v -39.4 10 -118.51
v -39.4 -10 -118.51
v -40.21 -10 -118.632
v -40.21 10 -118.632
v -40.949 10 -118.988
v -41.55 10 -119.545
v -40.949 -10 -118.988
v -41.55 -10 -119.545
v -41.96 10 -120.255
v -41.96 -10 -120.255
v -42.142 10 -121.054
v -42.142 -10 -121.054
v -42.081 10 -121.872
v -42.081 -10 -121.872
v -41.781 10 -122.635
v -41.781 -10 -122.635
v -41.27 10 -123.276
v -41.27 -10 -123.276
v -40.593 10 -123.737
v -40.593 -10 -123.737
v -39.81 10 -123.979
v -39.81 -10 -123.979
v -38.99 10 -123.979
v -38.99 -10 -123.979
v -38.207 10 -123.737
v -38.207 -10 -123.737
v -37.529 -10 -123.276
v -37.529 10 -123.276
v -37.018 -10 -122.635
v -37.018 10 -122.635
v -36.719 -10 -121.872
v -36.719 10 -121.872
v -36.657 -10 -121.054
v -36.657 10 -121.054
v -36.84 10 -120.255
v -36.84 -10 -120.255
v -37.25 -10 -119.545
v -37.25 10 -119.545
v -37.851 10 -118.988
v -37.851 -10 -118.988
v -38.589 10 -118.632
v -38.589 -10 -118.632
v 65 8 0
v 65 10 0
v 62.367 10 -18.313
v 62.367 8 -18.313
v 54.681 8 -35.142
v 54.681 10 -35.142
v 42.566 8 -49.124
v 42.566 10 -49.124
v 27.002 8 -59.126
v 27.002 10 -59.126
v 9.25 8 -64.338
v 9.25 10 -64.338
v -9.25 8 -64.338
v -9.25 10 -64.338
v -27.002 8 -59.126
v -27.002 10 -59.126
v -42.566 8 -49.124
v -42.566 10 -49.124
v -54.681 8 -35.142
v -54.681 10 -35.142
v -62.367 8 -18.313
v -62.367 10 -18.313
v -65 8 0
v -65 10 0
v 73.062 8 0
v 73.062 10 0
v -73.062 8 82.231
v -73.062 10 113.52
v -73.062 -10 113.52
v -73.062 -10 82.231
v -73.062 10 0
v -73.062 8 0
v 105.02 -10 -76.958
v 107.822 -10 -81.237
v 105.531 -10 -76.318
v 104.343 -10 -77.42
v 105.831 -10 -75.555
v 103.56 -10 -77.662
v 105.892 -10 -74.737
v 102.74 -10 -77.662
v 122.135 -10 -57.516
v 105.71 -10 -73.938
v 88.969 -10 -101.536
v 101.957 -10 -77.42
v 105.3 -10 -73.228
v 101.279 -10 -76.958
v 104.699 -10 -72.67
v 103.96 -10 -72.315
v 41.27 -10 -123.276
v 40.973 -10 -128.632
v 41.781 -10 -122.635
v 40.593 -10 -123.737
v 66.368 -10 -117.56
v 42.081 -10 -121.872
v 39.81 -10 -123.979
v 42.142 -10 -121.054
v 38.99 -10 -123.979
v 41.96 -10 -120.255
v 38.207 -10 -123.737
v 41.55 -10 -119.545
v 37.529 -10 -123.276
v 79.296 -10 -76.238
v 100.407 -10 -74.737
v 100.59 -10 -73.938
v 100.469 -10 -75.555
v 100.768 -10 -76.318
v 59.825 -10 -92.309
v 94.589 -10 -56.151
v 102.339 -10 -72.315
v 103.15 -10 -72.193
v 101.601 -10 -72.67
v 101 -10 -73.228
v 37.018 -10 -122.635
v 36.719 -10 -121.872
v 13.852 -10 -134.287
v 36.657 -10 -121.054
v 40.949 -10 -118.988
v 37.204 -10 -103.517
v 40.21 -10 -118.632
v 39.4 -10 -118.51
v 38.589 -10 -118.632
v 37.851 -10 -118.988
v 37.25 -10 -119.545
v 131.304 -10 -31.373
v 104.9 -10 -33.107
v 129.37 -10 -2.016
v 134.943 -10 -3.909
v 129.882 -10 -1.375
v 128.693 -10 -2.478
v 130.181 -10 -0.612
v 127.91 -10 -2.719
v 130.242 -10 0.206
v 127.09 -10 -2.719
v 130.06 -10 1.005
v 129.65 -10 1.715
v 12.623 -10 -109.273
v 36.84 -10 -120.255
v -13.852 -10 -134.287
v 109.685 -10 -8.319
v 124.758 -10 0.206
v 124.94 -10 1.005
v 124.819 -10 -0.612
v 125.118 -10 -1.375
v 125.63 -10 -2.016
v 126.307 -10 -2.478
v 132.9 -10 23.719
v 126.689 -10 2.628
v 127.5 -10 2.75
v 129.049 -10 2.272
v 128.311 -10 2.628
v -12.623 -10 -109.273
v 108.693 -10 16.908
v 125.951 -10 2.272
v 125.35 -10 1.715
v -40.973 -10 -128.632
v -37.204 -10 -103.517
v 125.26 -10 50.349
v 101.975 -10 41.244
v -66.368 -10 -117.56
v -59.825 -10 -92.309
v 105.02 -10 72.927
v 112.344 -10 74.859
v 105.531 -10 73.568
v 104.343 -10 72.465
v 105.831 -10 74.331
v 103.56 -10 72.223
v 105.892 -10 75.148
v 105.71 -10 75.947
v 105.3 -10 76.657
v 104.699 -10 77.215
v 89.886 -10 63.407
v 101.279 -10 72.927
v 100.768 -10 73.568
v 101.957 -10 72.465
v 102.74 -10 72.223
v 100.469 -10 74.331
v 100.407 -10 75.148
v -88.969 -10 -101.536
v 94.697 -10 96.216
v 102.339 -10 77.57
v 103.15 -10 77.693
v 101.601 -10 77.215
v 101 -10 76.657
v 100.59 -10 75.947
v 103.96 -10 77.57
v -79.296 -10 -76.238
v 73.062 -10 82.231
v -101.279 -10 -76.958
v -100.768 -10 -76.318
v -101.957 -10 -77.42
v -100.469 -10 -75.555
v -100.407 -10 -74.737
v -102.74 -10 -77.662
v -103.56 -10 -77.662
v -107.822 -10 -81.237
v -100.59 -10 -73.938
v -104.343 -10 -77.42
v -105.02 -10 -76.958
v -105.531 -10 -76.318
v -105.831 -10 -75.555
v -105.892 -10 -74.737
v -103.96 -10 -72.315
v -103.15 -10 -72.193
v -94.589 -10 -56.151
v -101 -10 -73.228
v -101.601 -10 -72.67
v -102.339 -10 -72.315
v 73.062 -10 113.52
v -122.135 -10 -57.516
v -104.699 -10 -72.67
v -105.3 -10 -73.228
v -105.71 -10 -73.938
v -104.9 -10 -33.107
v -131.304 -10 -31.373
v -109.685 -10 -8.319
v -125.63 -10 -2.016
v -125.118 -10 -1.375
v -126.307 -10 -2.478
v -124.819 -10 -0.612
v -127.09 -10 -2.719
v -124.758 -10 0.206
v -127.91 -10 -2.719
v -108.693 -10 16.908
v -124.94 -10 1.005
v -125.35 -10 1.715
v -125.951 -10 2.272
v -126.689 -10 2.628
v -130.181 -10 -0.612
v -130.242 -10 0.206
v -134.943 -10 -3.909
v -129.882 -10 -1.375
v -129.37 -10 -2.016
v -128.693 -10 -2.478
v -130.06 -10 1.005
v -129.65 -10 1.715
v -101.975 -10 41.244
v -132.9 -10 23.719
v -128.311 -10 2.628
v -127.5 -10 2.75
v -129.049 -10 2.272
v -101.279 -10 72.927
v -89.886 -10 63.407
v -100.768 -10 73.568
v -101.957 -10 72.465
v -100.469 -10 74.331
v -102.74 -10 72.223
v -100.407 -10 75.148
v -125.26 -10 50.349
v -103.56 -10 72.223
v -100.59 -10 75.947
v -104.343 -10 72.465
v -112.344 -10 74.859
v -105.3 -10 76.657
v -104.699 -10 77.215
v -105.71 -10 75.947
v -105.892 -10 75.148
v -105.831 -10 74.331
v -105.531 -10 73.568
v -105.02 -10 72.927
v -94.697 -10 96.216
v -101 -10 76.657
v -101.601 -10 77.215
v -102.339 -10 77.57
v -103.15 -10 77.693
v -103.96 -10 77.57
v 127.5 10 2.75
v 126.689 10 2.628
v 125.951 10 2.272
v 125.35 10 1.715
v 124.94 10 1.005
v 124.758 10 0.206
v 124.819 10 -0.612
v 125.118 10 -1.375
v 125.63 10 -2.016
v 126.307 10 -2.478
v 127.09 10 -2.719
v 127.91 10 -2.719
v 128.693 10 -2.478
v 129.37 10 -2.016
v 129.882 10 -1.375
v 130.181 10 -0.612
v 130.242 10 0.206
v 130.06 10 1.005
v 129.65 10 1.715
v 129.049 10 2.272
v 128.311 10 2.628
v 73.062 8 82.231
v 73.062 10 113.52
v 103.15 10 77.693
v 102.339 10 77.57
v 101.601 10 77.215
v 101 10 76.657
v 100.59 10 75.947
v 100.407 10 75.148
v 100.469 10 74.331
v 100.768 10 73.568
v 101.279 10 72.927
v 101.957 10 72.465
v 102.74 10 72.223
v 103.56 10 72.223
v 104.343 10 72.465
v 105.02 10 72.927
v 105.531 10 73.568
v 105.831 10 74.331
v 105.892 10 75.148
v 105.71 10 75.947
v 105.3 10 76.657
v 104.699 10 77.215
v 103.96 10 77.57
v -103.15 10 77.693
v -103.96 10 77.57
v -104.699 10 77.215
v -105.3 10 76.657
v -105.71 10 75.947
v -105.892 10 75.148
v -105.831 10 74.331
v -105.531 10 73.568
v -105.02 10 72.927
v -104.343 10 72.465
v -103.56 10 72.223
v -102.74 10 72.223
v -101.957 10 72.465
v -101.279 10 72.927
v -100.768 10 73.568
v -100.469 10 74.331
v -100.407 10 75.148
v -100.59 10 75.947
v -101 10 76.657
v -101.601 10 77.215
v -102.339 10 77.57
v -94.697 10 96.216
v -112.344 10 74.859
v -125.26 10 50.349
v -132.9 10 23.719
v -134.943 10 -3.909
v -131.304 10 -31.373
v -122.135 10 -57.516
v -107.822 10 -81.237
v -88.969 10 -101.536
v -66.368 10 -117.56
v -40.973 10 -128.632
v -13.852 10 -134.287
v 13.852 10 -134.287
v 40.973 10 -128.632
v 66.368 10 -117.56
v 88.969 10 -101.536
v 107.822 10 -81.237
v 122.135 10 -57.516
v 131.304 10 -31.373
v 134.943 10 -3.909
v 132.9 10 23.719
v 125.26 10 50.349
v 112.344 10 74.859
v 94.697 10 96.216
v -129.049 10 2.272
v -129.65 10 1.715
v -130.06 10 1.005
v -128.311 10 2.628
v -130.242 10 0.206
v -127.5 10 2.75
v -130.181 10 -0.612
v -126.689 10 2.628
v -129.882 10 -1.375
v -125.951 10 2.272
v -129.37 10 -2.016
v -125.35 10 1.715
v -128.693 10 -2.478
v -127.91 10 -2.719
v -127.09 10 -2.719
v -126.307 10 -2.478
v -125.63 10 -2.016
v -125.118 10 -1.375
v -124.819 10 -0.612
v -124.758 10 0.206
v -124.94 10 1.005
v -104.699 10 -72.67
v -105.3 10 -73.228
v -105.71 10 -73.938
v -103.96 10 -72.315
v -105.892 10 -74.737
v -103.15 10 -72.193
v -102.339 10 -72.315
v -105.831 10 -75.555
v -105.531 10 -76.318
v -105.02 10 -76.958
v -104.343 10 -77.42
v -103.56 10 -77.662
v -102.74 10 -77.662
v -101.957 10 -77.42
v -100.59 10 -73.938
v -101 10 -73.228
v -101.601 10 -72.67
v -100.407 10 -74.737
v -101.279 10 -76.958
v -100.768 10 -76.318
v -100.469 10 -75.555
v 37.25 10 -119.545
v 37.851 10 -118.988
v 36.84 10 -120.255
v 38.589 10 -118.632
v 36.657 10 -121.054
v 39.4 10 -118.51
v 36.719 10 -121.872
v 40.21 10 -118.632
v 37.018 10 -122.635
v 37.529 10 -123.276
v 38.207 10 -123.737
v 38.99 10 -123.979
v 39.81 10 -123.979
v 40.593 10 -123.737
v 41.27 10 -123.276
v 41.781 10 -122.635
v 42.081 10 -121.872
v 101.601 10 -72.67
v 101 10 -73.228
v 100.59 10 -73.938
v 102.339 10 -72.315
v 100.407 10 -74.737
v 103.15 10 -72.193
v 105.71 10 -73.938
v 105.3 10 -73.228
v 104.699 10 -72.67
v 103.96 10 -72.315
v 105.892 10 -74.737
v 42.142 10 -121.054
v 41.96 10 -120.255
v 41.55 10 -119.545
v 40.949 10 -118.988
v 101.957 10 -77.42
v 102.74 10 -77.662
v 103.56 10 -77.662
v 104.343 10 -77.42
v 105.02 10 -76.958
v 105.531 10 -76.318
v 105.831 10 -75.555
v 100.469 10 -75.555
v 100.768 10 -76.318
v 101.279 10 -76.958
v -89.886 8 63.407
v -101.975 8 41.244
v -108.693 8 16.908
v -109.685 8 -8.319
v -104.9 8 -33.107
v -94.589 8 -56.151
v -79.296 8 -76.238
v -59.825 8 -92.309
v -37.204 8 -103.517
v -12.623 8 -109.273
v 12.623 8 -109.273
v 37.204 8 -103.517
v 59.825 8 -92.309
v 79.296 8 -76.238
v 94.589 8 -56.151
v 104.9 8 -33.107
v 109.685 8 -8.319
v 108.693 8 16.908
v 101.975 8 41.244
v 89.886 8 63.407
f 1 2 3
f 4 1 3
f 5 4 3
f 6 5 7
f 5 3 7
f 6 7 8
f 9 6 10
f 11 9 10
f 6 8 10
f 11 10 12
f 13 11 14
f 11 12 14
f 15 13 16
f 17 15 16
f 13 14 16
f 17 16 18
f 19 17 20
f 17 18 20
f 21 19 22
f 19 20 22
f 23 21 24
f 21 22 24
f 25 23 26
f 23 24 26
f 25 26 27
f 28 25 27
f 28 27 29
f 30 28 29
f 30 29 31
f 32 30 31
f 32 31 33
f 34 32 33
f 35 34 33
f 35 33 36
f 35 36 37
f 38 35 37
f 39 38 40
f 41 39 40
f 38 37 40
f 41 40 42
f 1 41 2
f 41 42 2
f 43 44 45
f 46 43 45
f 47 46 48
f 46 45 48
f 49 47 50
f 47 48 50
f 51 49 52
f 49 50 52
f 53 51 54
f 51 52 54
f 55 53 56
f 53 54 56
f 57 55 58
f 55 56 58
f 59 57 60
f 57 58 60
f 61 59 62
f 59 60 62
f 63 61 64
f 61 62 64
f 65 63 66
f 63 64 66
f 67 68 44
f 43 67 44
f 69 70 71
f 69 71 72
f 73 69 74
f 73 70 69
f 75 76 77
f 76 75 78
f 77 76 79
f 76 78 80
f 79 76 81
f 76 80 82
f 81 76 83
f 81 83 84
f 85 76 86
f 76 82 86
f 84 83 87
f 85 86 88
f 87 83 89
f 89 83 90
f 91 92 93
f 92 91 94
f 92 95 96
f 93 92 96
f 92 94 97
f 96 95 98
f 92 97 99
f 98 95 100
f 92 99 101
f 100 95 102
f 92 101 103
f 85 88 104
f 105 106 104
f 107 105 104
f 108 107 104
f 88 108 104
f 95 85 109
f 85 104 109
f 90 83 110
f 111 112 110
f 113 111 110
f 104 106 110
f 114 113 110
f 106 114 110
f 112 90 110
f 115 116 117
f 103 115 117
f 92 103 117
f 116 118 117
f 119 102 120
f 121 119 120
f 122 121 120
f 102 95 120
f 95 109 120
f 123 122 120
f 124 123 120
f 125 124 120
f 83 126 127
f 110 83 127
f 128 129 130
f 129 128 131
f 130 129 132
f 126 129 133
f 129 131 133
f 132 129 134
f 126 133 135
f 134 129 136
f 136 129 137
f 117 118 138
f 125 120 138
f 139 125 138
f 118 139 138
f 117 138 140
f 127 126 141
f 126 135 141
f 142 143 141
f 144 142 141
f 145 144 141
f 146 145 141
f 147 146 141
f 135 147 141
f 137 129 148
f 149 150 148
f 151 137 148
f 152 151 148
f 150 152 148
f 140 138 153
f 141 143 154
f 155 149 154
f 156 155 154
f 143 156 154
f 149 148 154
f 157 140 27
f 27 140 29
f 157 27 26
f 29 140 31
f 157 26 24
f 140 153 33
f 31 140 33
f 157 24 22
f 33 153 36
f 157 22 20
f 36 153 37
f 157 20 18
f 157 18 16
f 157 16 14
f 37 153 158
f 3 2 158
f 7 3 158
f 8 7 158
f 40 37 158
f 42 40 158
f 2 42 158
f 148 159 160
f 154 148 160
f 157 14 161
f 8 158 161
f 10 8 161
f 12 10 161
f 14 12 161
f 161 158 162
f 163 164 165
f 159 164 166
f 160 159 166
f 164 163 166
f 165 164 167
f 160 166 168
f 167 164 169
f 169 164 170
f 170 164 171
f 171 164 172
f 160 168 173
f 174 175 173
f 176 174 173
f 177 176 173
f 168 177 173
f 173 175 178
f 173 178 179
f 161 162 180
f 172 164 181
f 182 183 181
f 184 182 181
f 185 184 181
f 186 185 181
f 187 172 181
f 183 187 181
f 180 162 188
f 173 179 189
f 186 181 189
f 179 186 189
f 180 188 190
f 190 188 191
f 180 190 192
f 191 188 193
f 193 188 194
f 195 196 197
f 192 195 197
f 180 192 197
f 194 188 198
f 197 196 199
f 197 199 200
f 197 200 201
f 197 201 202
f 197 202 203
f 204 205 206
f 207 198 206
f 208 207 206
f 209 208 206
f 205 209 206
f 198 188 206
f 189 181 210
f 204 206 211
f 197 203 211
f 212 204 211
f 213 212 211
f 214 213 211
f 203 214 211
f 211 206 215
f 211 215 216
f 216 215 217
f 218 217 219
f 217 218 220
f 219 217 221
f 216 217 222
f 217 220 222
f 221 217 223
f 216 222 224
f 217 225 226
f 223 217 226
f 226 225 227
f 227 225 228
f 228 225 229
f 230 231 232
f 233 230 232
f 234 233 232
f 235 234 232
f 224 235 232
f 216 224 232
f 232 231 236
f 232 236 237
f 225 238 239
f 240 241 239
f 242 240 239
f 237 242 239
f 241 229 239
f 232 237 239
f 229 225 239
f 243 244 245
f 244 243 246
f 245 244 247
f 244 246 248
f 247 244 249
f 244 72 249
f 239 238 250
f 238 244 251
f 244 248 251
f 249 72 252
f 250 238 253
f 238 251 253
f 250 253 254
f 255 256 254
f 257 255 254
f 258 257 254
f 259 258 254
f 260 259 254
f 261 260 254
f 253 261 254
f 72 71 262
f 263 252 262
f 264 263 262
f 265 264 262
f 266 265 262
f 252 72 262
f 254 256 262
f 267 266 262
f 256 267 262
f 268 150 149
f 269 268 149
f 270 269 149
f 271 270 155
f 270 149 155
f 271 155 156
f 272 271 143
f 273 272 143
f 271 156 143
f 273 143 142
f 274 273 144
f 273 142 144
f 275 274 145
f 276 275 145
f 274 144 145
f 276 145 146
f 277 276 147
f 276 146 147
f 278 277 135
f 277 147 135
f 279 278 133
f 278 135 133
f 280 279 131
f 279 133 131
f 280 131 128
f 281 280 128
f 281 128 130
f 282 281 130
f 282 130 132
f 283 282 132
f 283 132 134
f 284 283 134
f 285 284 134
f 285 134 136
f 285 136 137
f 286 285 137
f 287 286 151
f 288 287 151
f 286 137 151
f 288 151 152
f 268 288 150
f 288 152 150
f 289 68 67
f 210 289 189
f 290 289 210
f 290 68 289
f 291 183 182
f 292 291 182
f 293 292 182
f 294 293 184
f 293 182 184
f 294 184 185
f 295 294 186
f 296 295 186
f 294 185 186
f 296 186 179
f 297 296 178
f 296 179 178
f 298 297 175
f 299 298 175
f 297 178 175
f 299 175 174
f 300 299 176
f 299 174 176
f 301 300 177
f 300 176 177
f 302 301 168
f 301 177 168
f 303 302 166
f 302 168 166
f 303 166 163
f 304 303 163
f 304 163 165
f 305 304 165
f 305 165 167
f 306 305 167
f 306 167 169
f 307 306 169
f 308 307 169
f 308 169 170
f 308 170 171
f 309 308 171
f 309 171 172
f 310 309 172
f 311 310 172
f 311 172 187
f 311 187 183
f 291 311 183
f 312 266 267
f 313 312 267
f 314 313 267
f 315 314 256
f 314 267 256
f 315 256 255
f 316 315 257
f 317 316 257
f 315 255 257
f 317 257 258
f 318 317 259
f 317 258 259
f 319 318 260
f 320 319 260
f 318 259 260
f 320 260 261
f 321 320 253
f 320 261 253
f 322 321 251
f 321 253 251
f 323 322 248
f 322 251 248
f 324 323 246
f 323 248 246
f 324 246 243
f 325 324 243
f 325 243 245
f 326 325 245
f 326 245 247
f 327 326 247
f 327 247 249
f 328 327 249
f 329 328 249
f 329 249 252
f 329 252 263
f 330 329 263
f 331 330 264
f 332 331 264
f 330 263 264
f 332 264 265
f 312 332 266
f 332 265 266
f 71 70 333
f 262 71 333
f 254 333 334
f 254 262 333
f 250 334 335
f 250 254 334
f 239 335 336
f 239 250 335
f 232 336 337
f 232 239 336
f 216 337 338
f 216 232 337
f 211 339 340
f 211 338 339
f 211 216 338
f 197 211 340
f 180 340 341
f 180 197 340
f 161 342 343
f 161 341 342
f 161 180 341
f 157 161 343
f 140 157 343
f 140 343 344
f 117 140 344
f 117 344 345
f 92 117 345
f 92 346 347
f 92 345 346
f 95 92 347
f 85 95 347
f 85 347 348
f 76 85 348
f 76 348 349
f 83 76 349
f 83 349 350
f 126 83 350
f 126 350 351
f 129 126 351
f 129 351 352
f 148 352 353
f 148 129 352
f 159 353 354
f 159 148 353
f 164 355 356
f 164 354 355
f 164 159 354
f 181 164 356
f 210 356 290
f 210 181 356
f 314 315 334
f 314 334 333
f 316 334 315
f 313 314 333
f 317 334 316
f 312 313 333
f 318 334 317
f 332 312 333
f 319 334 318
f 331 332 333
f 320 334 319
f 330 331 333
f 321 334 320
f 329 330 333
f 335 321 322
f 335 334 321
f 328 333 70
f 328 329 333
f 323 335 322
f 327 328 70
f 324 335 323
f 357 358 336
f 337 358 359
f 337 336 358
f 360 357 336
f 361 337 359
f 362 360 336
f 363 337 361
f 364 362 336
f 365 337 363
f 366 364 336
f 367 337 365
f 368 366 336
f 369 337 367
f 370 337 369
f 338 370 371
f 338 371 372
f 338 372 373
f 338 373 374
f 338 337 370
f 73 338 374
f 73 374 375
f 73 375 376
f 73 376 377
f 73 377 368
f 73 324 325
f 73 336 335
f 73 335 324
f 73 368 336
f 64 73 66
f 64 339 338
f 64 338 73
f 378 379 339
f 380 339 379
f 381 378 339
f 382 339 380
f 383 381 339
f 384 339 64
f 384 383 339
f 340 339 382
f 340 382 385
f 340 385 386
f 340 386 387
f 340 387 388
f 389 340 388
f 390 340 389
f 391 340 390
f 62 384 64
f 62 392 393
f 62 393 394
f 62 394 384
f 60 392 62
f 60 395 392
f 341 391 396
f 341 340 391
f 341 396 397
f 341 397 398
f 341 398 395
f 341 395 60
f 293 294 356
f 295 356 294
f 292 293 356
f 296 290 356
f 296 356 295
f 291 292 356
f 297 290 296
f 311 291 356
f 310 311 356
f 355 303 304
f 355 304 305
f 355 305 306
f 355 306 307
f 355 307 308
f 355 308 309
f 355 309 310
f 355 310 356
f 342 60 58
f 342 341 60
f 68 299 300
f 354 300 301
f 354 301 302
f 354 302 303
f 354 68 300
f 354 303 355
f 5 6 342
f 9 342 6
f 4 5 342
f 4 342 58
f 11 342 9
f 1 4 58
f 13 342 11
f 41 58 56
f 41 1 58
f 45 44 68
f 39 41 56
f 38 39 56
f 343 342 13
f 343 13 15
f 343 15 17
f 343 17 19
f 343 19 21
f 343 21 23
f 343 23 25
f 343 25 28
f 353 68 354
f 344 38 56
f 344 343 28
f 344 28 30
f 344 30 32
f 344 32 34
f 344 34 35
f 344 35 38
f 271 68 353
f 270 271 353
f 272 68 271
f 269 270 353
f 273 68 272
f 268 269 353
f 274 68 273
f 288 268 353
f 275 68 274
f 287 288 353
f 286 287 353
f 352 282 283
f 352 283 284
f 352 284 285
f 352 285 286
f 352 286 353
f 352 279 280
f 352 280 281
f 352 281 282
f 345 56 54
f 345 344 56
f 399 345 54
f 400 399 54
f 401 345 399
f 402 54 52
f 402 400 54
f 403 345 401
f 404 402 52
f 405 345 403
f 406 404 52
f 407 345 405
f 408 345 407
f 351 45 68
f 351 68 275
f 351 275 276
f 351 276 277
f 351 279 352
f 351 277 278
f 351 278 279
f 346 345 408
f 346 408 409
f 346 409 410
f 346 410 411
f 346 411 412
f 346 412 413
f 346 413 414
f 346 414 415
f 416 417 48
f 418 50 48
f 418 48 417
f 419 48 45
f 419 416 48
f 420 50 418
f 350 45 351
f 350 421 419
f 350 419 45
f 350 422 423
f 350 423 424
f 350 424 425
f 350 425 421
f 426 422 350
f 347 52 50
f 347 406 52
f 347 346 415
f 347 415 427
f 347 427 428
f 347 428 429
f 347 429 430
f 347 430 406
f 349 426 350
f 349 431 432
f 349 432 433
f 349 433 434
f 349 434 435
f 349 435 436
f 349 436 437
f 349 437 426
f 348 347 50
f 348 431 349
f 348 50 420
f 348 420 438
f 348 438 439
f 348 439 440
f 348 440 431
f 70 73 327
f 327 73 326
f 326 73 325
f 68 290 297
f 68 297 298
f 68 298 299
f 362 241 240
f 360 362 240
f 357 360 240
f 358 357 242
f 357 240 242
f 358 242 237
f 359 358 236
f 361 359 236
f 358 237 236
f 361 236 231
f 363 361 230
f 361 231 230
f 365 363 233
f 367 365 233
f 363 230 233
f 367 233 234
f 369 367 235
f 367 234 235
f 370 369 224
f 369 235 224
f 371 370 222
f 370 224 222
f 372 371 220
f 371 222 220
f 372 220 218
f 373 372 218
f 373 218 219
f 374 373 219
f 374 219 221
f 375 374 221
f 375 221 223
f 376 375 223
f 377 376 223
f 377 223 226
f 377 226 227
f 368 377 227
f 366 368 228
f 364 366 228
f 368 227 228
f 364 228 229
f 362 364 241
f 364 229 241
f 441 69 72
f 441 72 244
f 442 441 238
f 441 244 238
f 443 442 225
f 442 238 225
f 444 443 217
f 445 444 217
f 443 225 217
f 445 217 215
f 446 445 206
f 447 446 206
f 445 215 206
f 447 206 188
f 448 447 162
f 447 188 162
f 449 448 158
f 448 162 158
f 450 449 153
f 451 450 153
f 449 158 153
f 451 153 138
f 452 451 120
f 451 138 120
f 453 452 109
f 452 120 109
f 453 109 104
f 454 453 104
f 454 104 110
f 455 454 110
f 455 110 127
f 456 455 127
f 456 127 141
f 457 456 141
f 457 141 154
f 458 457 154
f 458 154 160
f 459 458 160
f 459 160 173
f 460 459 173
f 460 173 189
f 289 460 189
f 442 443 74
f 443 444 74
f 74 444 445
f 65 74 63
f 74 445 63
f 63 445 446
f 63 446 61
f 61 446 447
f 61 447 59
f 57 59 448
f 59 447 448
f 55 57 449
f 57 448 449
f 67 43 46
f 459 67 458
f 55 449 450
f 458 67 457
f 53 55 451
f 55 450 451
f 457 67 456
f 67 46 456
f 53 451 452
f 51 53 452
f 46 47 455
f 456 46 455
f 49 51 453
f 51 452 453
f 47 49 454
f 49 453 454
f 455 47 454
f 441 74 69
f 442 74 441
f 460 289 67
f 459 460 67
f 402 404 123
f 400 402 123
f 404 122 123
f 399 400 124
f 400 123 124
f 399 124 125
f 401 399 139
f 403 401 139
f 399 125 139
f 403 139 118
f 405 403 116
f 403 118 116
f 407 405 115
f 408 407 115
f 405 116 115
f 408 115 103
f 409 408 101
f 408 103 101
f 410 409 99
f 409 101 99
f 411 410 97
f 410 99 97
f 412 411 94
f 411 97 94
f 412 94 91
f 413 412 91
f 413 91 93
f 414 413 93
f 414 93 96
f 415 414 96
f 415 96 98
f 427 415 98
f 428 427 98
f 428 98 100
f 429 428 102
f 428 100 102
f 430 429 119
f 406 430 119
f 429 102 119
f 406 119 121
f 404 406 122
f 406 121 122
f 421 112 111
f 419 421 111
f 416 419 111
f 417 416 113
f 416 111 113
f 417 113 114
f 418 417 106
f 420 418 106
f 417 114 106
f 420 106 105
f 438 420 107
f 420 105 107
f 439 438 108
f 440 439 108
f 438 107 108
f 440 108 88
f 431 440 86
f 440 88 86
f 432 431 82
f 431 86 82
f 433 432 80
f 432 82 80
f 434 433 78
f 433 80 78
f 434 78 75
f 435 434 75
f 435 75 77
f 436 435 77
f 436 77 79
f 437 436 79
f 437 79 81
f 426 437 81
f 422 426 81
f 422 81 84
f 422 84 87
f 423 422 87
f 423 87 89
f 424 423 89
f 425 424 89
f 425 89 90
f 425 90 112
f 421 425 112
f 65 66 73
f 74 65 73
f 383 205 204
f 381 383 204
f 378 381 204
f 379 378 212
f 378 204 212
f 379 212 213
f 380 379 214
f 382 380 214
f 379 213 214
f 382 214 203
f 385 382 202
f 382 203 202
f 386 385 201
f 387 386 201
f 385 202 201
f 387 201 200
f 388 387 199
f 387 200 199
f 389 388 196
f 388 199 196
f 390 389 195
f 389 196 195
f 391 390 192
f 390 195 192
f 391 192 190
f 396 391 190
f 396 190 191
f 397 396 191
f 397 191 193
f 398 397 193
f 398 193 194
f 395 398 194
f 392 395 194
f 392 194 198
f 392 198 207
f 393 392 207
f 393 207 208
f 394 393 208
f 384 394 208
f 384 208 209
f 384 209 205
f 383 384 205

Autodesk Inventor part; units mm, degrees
ref_plane "YZ Plane" through (0, 0, 0) normal (1, 0, 0) x (0, 1, 0)
ref_plane "XZ Plane" through (0, 0, 0) normal (0, 1, 0) x (-1, 0, 0)
ref_plane "XY Plane" through (0, 0, 0) normal (0, 0, 1) x (1, 0, 0)
sketch "Sketch1" plane through (0, 0, 0) normal (0, 1, 0) x (-1, 0, 0)
  circle A0 centre (0, 0) radius 135
  circle A1 centre (0, 0) radius 110
  dimension "d0" = 270
  dimension "d1" = 220
extrude "Extrusion1" add sketch "Sketch1" along normal mid plane 20
sketch "Sketch3" plane through (0, 10, 0) normal (0, 1, 0) x (1, 0, 0)
  circle A0 centre (0, 0) radius 127.5
  circle A1 centre (127.5, 0) radius 2.5
  circle A2 centre (103.1497, 74.9426) radius 2.5
  circle A3 centre (39.3997, 121.2597) radius 2.5
  circle A4 centre (-39.3997, 121.2597) radius 2.5
  circle A5 centre (-103.1497, 74.9426) radius 2.5
  circle A6 centre (-127.5, 0) radius 2.5
  circle A7 centre (-103.1497, -74.9426) radius 2.5
  circle A8 centre (-39.3997, -121.2597) radius 2.5
  circle A9 centre (39.3997, -121.2597) radius 2.5
  circle A10 centre (103.1497, -74.9426) radius 2.5
  dimension "d7" = 255
  dimension "d8" = 5
  dimension "d11" = 360
hole "Hole1" at (127.5, 10, 0) at (103.1497, 10, 74.9426) at (39.3997, 10, 121.2597) at (-39.3997, 10, 121.2597) at (-103.1497, 10, 74.9426) at (-127.5, 10, 0) at (-103.1497, 10, -74.9426) at (-39.3997, 10, -121.2597) at (39.3997, 10, -121.2597) at (103.1497, 10, -74.9426) direction (0, -1, 0) diameter 5.5 end through all
sketch "Sketch4" plane through (0, 10, 0) normal (0, 1, 0) x (1, 0, 0)
  circle A0 centre (0, 0) radius 110
  circle A1 centre (0, 0) radius 65
  dimension "d21" = 130
extrude "Extrusion3" add sketch "Sketch4" against normal blind 2
sketch "Sketch5" plane through (0, 10, 0) normal (0, 1, 0) x (1, 0, 0)
  line L0 (73.0625, -175) -> (-73.0625, -175)
  line L1 (-73.0625, -175) -> (-73.0625, 175)
  line L2 (-73.0625, 175) -> (73.0625, 175)
  line L3 (73.0625, 175) -> (73.0625, -175)
  line L4 (73.0625, -175) -> (-73.0625, 175) construction
  line L5 (-73.0625, -175) -> (73.0625, 175) construction
  line L6 (73.0625, 0) -> (-74.6125, 0)
  point P0 (0, 0)
  point P1 (-73.0625, 0)
  dimension "d24" = 146.125
  dimension "d25" = 350
extrude "Extrusion4" cut sketch "Sketch5" against normal through all contours L0 L1 L6 L3
properties part number "Cylinder Spacer 25mm"
